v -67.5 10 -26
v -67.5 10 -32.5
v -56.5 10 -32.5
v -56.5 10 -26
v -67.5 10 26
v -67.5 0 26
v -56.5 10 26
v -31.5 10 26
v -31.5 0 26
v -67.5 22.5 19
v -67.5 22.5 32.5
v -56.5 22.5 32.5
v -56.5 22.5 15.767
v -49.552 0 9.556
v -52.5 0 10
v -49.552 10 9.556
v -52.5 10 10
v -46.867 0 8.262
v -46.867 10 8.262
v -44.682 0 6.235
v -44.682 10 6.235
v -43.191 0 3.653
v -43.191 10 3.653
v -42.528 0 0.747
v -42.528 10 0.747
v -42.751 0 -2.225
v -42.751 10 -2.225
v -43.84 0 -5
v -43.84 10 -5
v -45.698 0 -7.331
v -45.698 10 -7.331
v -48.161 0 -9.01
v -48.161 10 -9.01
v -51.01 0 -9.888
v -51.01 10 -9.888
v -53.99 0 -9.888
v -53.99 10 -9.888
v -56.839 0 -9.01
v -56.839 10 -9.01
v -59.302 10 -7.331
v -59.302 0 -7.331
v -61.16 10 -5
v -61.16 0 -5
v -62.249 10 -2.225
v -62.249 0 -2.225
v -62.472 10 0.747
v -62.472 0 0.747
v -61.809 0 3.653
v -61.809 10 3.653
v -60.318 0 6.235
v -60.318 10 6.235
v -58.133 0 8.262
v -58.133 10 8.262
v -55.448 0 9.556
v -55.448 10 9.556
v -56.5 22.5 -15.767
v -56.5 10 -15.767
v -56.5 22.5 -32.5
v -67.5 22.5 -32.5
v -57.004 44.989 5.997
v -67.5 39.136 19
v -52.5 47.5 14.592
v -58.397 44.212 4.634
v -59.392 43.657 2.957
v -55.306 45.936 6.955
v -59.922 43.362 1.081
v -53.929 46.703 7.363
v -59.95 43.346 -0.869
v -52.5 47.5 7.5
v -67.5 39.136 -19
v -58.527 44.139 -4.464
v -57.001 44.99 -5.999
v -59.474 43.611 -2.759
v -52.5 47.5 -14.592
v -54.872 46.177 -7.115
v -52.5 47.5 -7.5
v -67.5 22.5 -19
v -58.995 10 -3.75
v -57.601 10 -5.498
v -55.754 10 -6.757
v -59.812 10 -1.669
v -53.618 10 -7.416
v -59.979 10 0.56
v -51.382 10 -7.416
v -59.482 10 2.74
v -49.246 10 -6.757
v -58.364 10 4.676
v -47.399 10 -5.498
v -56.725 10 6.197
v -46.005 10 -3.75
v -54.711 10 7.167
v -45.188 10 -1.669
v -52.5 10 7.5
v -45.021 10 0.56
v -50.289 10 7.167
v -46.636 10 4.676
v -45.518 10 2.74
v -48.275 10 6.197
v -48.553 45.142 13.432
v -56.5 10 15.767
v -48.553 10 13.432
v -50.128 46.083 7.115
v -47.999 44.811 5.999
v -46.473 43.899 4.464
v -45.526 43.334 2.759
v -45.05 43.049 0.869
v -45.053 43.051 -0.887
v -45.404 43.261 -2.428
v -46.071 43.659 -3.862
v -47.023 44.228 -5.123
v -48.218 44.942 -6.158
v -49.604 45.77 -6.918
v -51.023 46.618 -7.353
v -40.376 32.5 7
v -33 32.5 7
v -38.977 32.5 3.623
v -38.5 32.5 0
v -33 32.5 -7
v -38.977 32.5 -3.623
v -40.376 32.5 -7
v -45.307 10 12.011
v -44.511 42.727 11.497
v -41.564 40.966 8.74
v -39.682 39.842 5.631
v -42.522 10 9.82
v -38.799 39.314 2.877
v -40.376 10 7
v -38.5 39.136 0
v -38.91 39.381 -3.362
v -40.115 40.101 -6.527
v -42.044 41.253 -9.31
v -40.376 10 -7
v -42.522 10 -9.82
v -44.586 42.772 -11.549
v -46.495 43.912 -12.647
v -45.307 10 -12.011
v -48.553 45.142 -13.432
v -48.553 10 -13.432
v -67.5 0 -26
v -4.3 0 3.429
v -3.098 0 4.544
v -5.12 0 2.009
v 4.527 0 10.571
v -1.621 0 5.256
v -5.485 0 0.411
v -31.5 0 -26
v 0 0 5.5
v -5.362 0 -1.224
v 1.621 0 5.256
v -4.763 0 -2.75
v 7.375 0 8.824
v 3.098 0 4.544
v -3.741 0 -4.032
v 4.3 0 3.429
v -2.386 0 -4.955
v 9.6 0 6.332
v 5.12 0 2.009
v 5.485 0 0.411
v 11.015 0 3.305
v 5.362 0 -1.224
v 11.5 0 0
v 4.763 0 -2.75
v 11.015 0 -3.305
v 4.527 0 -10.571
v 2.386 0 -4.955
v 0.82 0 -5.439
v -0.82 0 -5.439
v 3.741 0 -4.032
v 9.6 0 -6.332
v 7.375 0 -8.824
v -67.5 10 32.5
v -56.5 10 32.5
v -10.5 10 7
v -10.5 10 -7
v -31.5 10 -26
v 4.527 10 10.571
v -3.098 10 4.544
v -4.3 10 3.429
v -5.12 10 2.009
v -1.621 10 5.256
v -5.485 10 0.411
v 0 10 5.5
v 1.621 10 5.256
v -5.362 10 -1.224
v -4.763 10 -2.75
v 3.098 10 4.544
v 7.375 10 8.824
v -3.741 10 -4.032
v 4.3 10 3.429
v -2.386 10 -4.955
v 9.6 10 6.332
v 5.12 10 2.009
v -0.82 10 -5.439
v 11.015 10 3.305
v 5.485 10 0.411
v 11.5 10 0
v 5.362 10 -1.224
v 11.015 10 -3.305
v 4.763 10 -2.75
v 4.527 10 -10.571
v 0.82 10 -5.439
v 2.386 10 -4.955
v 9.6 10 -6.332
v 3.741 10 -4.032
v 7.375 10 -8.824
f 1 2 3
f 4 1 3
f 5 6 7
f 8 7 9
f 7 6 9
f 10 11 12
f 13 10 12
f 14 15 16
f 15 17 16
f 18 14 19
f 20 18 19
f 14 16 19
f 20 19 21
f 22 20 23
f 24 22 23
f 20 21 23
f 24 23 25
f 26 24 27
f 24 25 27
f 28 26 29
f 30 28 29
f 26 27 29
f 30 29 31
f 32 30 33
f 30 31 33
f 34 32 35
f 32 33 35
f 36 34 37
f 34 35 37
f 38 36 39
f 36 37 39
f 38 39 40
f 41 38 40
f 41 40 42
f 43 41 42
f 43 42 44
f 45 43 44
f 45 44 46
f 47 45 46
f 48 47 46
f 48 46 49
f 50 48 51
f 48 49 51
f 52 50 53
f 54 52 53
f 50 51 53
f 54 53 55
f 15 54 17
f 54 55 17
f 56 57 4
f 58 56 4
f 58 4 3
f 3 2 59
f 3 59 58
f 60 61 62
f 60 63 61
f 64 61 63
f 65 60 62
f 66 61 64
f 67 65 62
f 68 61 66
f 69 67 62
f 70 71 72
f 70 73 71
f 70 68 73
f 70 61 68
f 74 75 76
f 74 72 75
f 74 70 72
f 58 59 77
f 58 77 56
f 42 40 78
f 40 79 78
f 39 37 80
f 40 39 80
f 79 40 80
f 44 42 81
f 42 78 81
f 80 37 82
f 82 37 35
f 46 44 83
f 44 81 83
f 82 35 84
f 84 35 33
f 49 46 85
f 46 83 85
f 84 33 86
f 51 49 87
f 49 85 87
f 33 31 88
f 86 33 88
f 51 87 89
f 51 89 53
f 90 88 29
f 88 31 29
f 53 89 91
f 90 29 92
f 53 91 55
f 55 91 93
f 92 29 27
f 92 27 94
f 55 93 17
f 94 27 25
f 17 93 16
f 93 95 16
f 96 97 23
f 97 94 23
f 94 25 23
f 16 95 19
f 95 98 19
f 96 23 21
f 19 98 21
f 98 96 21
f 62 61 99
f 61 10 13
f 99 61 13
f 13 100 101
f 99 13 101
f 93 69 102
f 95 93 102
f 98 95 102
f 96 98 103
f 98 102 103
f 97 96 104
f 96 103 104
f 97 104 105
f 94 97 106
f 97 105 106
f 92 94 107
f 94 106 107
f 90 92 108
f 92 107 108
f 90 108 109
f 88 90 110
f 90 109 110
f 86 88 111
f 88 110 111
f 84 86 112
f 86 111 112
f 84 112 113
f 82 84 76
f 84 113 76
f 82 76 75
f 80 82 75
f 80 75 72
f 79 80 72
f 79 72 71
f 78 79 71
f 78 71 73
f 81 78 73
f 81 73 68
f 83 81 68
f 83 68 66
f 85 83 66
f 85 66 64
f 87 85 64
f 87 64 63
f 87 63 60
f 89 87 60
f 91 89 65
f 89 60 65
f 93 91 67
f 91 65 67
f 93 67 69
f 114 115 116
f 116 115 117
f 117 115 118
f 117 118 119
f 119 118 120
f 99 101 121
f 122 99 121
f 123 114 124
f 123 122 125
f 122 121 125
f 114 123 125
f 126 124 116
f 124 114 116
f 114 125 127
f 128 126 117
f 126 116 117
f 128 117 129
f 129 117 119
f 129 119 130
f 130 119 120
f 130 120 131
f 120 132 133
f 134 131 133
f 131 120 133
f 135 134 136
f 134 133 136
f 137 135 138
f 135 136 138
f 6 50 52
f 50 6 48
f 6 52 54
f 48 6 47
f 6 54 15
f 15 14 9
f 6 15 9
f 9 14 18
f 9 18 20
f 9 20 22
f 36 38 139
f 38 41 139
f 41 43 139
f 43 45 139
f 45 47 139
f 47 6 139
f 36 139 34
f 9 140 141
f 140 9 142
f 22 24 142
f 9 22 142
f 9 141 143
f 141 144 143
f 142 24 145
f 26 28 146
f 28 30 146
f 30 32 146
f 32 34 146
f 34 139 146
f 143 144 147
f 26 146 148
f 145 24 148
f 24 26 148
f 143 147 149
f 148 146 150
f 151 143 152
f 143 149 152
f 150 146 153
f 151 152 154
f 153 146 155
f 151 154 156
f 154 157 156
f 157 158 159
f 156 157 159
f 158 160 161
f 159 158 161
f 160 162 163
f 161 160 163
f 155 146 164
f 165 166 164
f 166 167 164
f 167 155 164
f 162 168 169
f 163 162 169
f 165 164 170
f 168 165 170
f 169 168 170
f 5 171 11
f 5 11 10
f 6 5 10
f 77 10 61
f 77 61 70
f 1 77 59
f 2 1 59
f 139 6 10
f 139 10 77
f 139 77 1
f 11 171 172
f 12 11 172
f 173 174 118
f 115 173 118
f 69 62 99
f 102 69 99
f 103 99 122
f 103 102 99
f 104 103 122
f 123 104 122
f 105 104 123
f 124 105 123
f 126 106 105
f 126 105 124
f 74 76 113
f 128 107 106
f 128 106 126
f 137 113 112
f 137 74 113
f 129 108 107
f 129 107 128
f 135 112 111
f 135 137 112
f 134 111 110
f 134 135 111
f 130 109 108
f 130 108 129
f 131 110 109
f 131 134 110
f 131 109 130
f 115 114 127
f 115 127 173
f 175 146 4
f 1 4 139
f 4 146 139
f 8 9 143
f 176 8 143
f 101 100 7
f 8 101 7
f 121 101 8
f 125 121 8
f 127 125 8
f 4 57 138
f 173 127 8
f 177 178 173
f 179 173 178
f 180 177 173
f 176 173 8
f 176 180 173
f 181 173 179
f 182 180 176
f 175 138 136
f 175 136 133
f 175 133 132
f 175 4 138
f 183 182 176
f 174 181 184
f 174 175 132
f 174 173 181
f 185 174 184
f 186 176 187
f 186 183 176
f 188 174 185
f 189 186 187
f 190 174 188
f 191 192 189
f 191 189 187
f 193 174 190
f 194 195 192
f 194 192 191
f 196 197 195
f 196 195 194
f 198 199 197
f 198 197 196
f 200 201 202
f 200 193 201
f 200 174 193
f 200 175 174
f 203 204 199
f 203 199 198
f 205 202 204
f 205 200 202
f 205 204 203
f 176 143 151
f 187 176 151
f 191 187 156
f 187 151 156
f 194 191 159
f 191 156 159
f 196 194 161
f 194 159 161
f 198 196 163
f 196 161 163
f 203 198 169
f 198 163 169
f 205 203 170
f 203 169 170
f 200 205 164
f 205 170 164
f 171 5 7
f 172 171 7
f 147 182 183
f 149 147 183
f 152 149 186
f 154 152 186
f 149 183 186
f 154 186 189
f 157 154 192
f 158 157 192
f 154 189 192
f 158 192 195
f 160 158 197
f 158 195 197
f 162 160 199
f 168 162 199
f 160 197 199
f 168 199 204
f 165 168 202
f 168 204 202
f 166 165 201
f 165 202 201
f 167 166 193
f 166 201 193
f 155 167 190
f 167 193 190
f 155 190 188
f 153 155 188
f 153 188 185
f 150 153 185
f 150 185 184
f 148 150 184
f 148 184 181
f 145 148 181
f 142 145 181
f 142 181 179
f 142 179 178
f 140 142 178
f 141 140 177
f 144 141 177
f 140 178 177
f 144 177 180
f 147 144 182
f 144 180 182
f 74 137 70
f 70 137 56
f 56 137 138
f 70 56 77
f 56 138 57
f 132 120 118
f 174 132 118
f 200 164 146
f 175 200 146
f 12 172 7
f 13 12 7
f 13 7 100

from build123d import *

# Parameters (mm, degrees)
BOSS_EXTRUDE2_DEPTH = 10
SKETCH2_R           = 5.5
CUT_EXTRUDE1_DEPTH  = 10
SKETCH3_W           = 11
SKETCH3_H           = 65
BOSS_EXTRUDE3_DEPTH = 12.5
BOSS_EXTRUDE4_START = -10
BOSS_EXTRUDE4_DEPTH = 47.5
SKETCH7_R           = 7.5
CUT_EXTRUDE2_DEPTH  = 89.705974996
RIB1_START          = -7
RIB1_DEPTH          = 14
CUT_EXTRUDE3_START  = -19
CUT_EXTRUDE3_DEPTH  = 38


# Read off the part's stored shape, not the designer's step: Rib1, Cut-Extrude3
with BuildPart() as part:
    # Sketch1 → Boss-Extrude2 (new body)
    with BuildSketch(Plane(origin=(0, 0, 0), x_dir=(1, 0, 0), z_dir=(0, 1, 0))):
        with BuildLine():
            Line((-67.5, 26), (-67.5, -26))
            Line((-67.5, -26), (-31.5, -26))
            Line((-31.5, -26), (4.527189528, -10.571402697))
            ThreePointArc((4.527189528, -10.571402697), (11.5, 0), (4.527189528, 10.571402697))
            Line((4.527189528, 10.571402697), (-31.5, 26))
            Line((-31.5, 26), (-67.5, 26))
        make_face()
    extrude(amount=BOSS_EXTRUDE2_DEPTH)

    # Sketch2 → Cut-Extrude1 (cut)
    with BuildSketch(Plane(origin=(0, 10, 0), x_dir=(1, 0, 0), z_dir=(0, 1, 0))):
        with Locations(Location((0, 0, 0), (0, 0, 270))):
            Circle(SKETCH2_R)
    extrude(amount=-CUT_EXTRUDE1_DEPTH, mode=Mode.SUBTRACT)

    # Sketch3 → Boss-Extrude3 (add)
    with BuildSketch(Plane(origin=(0, 10, 0), x_dir=(1, 0, 0), z_dir=(0, 1, 0))):
        with Locations((-62, 0)):
            Rectangle(SKETCH3_W, SKETCH3_H)
    extrude(amount=BOSS_EXTRUDE3_DEPTH)

    # Sketch4 → Boss-Extrude4 (add)
    with BuildSketch(Plane(origin=(0, 10, 0), x_dir=(1, 0, 0), z_dir=(0, 1, 0)).offset(BOSS_EXTRUDE4_START)):
        with BuildLine():
            Line((-67.5, 19), (-67.5, -19))
            Line((-67.5, -19), (-48.552766046, -13.432026806))
            ThreePointArc((-48.552766046, -13.432026806), (-38.5, 0), (-48.552766046, 13.432026806))
            Line((-48.552766046, 13.432026806), (-67.5, 19))
        make_face()
    extrude(amount=BOSS_EXTRUDE4_DEPTH)

    # Sketch6 → Hole1 (revolve, cut)
    with BuildSketch(Plane(origin=(-52.5, 10, 0), x_dir=(0, 0, 1), z_dir=(1, 0, 0))):
        Polygon((0, 0), (0, 10), (7, 10), (7, 15), (10, 15), (10, 0), align=None)
    revolve(axis=Axis((-52.5, -100, 0), (0, 1, 0)), mode=Mode.SUBTRACT)

    # Sketch7 → Cut-Extrude2 (cut, through all)
    with BuildSketch(Plane(origin=(0, 47.5, 0), x_dir=(1, 0, 0), z_dir=(0, 1, 0))):
        with Locations(Location((-52.5, 0, 0), (0, 0, 270))):
            Circle(SKETCH7_R)
    extrude(amount=-CUT_EXTRUDE2_DEPTH, mode=Mode.SUBTRACT)

    # Rib1 outline → Rib1 (add)
    with BuildSketch(Plane.XY.offset(RIB1_START)):
        Polygon((-33, 32.5), (-42, 32.5), (-42, 10), (-10.5, 10), align=None)
    extrude(amount=RIB1_DEPTH)

    # Cut-Extrude3 outline → Cut-Extrude3 (cut)
    with BuildSketch(Plane.XY.offset(CUT_EXTRUDE3_START)):
        Polygon((-37, 47.5), (-52.5, 47.5), (-38.5, 39.135888498), (-37, 38.239733694), align=None)
        Polygon((-67.5, 39.135888498), (-52.5, 47.5), (-67.5, 47.5), align=None)
    extrude(amount=CUT_EXTRUDE3_DEPTH, mode=Mode.SUBTRACT)


solid = part.part
